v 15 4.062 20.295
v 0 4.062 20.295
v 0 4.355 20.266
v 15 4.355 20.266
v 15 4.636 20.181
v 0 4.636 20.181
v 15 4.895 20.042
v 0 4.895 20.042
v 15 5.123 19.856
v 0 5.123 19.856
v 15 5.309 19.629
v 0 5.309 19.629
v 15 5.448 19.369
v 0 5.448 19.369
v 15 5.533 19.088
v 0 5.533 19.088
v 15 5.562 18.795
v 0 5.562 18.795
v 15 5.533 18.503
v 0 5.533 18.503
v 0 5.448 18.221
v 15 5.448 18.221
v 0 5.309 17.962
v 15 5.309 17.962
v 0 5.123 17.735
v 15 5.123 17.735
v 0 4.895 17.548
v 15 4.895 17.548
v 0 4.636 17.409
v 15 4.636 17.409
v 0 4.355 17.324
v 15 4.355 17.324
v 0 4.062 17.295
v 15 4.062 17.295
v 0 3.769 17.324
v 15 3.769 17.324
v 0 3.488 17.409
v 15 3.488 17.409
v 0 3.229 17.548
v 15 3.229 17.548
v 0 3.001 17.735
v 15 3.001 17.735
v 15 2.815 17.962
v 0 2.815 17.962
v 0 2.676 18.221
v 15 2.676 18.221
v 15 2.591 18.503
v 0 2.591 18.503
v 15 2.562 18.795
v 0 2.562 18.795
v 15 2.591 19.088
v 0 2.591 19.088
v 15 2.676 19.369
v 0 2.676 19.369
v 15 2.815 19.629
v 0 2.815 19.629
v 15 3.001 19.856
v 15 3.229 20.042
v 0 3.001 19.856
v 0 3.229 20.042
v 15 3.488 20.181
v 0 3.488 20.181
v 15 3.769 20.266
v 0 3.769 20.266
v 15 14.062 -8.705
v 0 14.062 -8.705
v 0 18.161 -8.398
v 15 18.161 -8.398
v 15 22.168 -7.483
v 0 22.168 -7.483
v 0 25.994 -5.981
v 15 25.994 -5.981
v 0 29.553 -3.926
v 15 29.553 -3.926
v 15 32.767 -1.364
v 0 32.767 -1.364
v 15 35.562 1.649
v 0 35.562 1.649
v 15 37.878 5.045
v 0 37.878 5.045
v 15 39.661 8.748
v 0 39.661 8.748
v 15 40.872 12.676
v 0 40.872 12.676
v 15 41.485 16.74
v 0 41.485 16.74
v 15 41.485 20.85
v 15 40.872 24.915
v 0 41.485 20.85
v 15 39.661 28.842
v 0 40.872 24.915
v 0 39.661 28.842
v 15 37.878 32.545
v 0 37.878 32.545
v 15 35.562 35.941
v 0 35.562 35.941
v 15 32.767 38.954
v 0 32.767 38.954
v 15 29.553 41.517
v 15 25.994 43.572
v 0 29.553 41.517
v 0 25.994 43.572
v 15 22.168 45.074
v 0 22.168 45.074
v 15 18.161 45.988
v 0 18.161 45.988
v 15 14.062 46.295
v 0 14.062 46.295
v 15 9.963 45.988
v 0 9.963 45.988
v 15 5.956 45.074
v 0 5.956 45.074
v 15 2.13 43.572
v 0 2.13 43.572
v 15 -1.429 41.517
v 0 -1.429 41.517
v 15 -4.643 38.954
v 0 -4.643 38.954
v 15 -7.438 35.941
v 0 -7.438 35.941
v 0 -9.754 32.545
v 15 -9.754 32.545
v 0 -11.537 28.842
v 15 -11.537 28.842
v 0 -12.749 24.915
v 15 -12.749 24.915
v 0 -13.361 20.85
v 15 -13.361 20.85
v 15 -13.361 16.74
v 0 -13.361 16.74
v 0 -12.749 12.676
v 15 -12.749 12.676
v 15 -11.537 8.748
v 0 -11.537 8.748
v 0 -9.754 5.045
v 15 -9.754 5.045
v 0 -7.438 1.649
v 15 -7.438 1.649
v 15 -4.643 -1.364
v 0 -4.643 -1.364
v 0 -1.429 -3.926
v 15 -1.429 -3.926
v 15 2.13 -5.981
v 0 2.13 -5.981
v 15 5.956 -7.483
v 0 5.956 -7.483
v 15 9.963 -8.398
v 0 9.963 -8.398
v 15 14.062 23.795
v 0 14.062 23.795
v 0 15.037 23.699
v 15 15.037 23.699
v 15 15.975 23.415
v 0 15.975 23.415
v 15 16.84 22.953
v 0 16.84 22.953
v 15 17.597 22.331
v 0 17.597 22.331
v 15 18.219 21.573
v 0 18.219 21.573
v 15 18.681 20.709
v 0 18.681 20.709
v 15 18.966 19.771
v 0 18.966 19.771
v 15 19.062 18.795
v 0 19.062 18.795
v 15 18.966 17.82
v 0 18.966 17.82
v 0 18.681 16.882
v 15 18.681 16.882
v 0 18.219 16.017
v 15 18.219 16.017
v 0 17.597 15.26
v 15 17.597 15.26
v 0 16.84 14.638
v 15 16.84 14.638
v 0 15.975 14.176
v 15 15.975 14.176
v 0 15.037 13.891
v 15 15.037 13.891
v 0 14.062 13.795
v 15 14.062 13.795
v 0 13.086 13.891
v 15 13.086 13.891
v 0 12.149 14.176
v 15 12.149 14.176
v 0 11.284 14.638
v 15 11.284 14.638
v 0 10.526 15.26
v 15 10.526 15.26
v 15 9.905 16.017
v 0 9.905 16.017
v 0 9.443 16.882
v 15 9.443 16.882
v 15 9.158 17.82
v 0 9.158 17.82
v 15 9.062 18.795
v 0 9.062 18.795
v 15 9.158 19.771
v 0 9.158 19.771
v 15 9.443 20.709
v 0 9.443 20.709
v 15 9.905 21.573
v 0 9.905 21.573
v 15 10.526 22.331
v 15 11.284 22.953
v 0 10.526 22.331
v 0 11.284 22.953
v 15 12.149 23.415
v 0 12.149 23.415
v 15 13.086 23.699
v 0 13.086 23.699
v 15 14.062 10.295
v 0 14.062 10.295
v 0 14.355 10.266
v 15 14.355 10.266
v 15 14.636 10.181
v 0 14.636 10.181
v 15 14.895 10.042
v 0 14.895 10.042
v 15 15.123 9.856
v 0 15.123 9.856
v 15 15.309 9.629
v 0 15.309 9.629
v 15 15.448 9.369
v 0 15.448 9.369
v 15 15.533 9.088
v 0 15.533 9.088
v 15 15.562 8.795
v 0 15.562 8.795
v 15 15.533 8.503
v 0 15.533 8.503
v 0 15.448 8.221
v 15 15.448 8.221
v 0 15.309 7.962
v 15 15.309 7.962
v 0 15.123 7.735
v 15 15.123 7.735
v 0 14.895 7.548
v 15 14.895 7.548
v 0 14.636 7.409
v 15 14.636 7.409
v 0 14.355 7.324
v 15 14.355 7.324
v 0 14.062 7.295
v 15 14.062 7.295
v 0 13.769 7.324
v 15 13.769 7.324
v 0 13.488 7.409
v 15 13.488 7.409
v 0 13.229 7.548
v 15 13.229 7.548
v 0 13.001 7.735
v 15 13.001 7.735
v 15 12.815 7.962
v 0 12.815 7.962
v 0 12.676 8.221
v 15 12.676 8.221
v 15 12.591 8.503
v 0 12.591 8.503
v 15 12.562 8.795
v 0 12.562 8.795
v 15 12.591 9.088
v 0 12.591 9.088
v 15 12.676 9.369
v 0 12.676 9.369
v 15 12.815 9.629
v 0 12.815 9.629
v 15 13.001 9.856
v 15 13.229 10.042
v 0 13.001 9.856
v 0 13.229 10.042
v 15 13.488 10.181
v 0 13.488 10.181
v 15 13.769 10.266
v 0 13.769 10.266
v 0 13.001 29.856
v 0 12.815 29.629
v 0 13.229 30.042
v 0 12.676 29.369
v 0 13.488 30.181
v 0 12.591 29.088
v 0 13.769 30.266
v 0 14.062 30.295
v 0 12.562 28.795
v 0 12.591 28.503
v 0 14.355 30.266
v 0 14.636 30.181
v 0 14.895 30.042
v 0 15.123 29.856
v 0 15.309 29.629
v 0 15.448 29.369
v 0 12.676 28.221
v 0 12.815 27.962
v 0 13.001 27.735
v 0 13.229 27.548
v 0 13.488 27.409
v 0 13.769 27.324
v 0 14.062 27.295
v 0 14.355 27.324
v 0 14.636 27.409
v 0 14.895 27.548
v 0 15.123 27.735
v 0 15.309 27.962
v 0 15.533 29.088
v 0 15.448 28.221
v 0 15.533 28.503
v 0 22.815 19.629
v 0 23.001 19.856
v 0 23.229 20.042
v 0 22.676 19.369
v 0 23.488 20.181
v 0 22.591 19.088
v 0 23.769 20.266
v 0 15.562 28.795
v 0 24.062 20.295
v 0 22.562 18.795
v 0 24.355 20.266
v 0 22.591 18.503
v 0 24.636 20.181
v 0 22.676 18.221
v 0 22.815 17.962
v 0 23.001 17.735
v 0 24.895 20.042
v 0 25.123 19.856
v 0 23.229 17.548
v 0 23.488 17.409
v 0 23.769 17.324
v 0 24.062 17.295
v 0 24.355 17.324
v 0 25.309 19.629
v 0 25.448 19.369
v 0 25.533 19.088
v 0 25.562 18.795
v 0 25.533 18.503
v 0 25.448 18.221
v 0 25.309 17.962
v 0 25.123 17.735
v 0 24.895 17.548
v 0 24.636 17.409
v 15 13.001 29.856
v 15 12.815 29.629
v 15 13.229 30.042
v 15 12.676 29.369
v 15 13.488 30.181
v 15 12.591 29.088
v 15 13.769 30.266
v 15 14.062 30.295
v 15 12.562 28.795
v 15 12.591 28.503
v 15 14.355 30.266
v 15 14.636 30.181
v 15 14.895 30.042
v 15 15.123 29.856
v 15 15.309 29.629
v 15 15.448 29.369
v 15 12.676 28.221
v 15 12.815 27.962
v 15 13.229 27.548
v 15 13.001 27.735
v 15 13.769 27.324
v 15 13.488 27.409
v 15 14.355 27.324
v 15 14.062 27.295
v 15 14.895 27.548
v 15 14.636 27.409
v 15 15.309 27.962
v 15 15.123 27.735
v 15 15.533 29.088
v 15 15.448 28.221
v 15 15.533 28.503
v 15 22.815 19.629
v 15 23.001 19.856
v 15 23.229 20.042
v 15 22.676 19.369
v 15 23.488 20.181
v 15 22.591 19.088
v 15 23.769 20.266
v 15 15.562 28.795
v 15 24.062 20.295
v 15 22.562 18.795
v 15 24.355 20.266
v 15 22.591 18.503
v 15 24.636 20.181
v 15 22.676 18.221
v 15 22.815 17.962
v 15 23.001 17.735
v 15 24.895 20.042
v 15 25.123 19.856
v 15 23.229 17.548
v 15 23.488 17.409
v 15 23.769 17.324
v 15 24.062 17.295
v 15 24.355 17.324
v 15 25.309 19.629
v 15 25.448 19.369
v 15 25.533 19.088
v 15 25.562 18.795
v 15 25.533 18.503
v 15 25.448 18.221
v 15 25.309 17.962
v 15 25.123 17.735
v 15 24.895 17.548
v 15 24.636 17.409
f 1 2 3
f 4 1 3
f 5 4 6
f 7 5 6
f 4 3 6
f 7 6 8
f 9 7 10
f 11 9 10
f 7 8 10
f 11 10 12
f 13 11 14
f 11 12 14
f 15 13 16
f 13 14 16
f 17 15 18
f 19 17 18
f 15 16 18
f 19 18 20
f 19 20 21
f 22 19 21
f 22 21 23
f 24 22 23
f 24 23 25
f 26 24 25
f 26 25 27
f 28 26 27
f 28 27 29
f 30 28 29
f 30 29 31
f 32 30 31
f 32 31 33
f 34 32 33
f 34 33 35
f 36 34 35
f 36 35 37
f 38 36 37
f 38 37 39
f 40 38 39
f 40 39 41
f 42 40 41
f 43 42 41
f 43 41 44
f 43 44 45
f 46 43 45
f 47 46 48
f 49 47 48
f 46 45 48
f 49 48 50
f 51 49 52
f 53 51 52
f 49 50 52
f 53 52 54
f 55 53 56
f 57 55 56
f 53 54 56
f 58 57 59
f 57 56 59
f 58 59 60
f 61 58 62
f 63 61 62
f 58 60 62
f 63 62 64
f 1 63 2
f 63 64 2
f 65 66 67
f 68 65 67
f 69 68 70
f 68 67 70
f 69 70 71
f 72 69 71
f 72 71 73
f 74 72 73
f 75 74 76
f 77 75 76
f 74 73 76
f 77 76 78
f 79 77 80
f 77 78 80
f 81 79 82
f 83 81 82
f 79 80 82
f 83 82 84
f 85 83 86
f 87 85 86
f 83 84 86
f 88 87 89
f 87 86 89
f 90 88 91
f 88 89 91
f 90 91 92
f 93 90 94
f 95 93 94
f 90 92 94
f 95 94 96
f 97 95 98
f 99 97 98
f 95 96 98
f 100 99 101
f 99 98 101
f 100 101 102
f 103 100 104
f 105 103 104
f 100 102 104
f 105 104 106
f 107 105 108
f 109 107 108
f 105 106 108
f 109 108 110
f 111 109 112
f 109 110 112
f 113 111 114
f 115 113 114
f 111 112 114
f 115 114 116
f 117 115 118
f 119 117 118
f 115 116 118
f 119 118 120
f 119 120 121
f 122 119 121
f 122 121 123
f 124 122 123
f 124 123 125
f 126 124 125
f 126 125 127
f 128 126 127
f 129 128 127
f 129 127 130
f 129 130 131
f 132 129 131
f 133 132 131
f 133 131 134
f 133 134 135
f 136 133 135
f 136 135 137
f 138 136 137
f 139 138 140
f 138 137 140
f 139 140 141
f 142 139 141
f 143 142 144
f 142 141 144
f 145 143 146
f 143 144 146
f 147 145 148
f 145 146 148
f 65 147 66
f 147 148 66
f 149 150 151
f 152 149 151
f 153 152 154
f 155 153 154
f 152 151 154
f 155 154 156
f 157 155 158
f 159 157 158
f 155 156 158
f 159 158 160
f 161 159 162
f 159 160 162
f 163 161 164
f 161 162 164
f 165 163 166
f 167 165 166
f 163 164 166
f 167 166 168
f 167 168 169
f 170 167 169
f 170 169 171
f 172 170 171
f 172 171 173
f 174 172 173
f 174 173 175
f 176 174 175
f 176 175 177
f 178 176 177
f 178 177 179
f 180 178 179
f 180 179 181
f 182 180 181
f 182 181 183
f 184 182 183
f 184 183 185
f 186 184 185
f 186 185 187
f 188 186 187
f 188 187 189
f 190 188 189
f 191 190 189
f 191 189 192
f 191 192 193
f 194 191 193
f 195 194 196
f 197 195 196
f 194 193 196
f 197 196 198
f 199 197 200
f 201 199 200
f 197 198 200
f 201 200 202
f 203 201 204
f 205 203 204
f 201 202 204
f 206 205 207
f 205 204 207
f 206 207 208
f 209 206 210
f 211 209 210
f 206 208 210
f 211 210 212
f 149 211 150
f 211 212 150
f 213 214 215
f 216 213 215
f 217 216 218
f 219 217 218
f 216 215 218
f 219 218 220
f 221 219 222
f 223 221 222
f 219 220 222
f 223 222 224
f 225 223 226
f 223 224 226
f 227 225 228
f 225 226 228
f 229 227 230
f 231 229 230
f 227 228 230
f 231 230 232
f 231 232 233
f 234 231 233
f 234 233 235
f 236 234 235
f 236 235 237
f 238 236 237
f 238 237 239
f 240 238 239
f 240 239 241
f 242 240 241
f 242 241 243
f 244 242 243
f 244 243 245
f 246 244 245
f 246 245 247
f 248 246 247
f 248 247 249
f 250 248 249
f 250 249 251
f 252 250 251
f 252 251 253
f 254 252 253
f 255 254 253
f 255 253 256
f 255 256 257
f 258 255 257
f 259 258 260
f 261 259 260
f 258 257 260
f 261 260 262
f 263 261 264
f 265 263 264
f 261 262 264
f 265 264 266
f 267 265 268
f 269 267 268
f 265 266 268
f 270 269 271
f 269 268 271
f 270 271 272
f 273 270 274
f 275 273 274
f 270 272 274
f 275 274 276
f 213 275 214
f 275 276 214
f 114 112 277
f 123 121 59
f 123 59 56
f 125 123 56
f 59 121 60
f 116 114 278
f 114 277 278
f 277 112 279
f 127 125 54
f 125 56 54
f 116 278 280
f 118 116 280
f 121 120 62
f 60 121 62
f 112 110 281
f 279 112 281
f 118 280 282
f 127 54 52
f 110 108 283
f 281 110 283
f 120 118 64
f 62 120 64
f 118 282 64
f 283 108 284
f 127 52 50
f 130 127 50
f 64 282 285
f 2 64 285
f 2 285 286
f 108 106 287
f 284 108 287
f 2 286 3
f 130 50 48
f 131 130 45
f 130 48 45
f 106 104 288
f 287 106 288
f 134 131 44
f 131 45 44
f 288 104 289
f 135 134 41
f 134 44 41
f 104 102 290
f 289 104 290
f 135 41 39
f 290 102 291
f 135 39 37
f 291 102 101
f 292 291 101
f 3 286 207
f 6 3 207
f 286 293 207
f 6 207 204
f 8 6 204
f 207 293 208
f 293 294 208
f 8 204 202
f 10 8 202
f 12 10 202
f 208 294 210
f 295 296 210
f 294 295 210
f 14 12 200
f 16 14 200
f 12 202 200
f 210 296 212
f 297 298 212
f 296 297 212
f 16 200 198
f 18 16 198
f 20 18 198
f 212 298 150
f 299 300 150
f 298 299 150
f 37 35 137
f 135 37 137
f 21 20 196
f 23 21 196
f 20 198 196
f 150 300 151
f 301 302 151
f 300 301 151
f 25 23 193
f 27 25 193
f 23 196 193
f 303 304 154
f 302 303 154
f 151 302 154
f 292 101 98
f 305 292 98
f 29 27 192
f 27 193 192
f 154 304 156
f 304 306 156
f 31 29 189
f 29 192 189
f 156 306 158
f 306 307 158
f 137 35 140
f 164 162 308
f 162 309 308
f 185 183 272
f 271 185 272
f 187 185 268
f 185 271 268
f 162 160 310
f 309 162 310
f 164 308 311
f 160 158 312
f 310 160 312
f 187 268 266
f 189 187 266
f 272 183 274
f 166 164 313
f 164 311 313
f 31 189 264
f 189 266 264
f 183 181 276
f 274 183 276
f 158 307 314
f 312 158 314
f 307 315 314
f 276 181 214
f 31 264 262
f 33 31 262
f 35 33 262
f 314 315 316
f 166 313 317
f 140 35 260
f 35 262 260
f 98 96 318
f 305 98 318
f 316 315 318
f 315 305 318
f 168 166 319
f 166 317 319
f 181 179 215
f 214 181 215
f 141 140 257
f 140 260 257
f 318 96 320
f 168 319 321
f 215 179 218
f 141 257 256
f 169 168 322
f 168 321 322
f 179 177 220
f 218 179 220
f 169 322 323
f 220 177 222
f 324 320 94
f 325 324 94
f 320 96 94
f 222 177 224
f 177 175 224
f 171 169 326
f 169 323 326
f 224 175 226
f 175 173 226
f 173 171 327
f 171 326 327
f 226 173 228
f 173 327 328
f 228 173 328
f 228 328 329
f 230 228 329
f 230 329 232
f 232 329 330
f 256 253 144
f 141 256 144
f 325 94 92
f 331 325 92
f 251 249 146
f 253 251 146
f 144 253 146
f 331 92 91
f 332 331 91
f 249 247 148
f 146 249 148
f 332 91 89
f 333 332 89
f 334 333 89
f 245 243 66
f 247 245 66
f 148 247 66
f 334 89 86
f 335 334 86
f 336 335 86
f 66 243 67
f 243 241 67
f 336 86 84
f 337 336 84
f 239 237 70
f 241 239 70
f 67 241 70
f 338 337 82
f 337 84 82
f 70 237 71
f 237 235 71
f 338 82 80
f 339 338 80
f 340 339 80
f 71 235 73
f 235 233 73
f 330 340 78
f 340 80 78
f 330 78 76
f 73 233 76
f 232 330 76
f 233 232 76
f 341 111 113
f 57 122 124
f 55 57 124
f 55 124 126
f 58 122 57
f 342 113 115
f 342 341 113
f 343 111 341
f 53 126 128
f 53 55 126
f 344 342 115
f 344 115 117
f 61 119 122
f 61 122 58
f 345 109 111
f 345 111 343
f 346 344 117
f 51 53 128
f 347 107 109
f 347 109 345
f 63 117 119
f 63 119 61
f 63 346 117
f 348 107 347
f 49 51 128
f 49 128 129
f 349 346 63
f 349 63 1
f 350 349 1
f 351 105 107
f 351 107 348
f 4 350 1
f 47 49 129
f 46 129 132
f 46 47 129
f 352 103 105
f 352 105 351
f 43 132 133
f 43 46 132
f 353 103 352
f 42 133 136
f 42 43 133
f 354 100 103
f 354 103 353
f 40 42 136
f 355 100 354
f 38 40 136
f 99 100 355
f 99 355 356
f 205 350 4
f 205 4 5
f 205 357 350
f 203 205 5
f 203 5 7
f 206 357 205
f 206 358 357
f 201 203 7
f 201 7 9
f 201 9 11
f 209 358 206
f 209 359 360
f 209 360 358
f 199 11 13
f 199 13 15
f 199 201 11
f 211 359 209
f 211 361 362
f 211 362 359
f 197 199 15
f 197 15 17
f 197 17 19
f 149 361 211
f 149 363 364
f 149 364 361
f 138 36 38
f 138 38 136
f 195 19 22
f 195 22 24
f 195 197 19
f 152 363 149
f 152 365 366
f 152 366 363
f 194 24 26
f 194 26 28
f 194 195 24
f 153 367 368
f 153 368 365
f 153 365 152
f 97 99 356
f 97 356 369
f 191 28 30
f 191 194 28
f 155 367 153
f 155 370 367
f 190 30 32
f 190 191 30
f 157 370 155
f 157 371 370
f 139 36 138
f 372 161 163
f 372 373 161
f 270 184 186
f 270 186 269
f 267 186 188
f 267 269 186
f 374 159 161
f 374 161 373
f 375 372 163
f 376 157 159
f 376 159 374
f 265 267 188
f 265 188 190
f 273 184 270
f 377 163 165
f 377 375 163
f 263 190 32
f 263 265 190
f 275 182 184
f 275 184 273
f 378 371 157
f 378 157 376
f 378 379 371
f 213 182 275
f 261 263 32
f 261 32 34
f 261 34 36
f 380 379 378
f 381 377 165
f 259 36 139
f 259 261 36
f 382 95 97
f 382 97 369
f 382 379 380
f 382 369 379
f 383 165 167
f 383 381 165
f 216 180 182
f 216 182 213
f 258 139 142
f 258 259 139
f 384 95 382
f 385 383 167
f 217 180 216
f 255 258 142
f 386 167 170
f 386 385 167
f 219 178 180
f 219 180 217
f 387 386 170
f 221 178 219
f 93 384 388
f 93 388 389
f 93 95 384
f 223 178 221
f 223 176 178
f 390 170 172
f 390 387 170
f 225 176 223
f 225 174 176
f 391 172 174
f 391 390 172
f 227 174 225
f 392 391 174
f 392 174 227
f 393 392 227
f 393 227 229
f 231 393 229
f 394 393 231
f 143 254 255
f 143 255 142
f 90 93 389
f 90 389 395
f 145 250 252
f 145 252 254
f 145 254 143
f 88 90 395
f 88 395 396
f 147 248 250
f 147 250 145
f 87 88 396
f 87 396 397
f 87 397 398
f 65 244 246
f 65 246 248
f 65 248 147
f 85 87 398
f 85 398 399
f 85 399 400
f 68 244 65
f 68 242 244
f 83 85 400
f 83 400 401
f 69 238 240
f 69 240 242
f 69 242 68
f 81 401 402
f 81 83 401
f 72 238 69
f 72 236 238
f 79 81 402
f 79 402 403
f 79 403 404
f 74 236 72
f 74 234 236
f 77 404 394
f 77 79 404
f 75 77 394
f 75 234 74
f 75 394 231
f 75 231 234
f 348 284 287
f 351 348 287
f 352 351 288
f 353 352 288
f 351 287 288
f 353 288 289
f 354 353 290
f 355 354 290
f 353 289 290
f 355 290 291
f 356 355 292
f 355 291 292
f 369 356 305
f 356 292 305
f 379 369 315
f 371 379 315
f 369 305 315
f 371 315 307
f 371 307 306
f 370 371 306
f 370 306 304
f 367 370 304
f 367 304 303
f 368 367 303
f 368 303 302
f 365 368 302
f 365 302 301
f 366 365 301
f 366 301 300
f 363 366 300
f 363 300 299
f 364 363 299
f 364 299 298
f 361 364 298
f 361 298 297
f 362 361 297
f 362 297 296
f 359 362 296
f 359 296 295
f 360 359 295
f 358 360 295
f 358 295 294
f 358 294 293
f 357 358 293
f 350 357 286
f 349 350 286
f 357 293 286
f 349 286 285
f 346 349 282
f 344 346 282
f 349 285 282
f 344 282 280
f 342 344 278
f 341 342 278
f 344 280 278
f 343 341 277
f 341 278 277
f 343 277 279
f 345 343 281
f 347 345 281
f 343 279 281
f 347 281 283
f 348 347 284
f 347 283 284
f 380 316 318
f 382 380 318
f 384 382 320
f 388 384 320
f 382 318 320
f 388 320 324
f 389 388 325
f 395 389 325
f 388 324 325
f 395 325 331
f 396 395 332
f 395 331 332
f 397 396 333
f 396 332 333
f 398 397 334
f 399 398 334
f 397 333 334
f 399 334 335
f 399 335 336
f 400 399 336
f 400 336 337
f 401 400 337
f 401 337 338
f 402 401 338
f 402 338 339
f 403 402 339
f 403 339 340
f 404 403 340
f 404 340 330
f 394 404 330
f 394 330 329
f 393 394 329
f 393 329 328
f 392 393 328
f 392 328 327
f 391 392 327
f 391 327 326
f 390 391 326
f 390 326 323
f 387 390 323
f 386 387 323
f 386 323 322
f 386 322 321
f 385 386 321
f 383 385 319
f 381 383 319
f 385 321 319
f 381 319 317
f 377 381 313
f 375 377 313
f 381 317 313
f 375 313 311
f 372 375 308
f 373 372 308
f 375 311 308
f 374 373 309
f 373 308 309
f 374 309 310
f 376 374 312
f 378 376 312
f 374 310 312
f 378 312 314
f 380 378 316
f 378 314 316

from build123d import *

# Parameters (mm, degrees)
SKETCH_1_R          = 27.5
EXTRUDE_1_DEPTH     = 15
CUT_EXTRUDE_1_REACH = 65.997
SKETCH_2_R          = 5
SKETCH_2_R_2        = 1.5


with BuildPart() as part:
    # 草图1 → 凸台-拉伸1 (new body)
    with BuildSketch(Plane(origin=(0, 0, 0), x_dir=(0, 0, -1), z_dir=(1, 0, 0))):
        with Locations((-18.795257752, 14.06192285)):
            Circle(SKETCH_1_R)
    extrude(amount=EXTRUDE_1_DEPTH)

    # 草图2 → 切除-拉伸1 (cut, up to next)
    with BuildSketch(Plane.ZY, mode=Mode.PRIVATE) as cut_extrude_1_sk1:
        with Locations((18.795257752, 14.06192285)):
            Circle(SKETCH_2_R)
    cut_extrude_1_tool1 = extrude(cut_extrude_1_sk1.sketch, amount=-CUT_EXTRUDE_1_REACH, mode=Mode.PRIVATE) & part.part
    # 草图2 → 切除-拉伸1 (cut, up to next)
    with BuildSketch(Plane.ZY, mode=Mode.PRIVATE) as cut_extrude_1_sk2:
        with Locations((18.795257752, 24.06192285)):
            Circle(SKETCH_2_R_2)
    cut_extrude_1_tool2 = extrude(cut_extrude_1_sk2.sketch, amount=-CUT_EXTRUDE_1_REACH, mode=Mode.PRIVATE) & part.part
    # 草图2 → 切除-拉伸1 (cut, up to next)
    with BuildSketch(Plane.ZY, mode=Mode.PRIVATE) as cut_extrude_1_sk3:
        with Locations((28.795257752, 14.06192285)):
            Circle(SKETCH_2_R_2)
    cut_extrude_1_tool3 = extrude(cut_extrude_1_sk3.sketch, amount=-CUT_EXTRUDE_1_REACH, mode=Mode.PRIVATE) & part.part
    # 草图2 → 切除-拉伸1 (cut, up to next)
    with BuildSketch(Plane.ZY, mode=Mode.PRIVATE) as cut_extrude_1_sk4:
        with Locations((8.795257752, 14.06192285)):
            Circle(SKETCH_2_R_2)
    cut_extrude_1_tool4 = extrude(cut_extrude_1_sk4.sketch, amount=-CUT_EXTRUDE_1_REACH, mode=Mode.PRIVATE) & part.part
    # 草图2 → 切除-拉伸1 (cut, up to next)
    with BuildSketch(Plane.ZY, mode=Mode.PRIVATE) as cut_extrude_1_sk5:
        with Locations((18.795257752, 4.06192285)):
            Circle(SKETCH_2_R_2)
    cut_extrude_1_tool5 = extrude(cut_extrude_1_sk5.sketch, amount=-CUT_EXTRUDE_1_REACH, mode=Mode.PRIVATE) & part.part
    add(cut_extrude_1_tool1.solids().sort_by_distance((0, 14.061923, 18.795258))[0], mode=Mode.SUBTRACT)
    add(cut_extrude_1_tool2.solids().sort_by_distance((0, 24.061923, 18.795258))[0], mode=Mode.SUBTRACT)
    add(cut_extrude_1_tool3.solids().sort_by_distance((0, 14.061923, 28.795258))[0], mode=Mode.SUBTRACT)
    add(cut_extrude_1_tool4.solids().sort_by_distance((0, 14.061923, 8.795258))[0], mode=Mode.SUBTRACT)
    add(cut_extrude_1_tool5.solids().sort_by_distance((0, 4.061923, 18.795258))[0], mode=Mode.SUBTRACT)


solid = part.part
